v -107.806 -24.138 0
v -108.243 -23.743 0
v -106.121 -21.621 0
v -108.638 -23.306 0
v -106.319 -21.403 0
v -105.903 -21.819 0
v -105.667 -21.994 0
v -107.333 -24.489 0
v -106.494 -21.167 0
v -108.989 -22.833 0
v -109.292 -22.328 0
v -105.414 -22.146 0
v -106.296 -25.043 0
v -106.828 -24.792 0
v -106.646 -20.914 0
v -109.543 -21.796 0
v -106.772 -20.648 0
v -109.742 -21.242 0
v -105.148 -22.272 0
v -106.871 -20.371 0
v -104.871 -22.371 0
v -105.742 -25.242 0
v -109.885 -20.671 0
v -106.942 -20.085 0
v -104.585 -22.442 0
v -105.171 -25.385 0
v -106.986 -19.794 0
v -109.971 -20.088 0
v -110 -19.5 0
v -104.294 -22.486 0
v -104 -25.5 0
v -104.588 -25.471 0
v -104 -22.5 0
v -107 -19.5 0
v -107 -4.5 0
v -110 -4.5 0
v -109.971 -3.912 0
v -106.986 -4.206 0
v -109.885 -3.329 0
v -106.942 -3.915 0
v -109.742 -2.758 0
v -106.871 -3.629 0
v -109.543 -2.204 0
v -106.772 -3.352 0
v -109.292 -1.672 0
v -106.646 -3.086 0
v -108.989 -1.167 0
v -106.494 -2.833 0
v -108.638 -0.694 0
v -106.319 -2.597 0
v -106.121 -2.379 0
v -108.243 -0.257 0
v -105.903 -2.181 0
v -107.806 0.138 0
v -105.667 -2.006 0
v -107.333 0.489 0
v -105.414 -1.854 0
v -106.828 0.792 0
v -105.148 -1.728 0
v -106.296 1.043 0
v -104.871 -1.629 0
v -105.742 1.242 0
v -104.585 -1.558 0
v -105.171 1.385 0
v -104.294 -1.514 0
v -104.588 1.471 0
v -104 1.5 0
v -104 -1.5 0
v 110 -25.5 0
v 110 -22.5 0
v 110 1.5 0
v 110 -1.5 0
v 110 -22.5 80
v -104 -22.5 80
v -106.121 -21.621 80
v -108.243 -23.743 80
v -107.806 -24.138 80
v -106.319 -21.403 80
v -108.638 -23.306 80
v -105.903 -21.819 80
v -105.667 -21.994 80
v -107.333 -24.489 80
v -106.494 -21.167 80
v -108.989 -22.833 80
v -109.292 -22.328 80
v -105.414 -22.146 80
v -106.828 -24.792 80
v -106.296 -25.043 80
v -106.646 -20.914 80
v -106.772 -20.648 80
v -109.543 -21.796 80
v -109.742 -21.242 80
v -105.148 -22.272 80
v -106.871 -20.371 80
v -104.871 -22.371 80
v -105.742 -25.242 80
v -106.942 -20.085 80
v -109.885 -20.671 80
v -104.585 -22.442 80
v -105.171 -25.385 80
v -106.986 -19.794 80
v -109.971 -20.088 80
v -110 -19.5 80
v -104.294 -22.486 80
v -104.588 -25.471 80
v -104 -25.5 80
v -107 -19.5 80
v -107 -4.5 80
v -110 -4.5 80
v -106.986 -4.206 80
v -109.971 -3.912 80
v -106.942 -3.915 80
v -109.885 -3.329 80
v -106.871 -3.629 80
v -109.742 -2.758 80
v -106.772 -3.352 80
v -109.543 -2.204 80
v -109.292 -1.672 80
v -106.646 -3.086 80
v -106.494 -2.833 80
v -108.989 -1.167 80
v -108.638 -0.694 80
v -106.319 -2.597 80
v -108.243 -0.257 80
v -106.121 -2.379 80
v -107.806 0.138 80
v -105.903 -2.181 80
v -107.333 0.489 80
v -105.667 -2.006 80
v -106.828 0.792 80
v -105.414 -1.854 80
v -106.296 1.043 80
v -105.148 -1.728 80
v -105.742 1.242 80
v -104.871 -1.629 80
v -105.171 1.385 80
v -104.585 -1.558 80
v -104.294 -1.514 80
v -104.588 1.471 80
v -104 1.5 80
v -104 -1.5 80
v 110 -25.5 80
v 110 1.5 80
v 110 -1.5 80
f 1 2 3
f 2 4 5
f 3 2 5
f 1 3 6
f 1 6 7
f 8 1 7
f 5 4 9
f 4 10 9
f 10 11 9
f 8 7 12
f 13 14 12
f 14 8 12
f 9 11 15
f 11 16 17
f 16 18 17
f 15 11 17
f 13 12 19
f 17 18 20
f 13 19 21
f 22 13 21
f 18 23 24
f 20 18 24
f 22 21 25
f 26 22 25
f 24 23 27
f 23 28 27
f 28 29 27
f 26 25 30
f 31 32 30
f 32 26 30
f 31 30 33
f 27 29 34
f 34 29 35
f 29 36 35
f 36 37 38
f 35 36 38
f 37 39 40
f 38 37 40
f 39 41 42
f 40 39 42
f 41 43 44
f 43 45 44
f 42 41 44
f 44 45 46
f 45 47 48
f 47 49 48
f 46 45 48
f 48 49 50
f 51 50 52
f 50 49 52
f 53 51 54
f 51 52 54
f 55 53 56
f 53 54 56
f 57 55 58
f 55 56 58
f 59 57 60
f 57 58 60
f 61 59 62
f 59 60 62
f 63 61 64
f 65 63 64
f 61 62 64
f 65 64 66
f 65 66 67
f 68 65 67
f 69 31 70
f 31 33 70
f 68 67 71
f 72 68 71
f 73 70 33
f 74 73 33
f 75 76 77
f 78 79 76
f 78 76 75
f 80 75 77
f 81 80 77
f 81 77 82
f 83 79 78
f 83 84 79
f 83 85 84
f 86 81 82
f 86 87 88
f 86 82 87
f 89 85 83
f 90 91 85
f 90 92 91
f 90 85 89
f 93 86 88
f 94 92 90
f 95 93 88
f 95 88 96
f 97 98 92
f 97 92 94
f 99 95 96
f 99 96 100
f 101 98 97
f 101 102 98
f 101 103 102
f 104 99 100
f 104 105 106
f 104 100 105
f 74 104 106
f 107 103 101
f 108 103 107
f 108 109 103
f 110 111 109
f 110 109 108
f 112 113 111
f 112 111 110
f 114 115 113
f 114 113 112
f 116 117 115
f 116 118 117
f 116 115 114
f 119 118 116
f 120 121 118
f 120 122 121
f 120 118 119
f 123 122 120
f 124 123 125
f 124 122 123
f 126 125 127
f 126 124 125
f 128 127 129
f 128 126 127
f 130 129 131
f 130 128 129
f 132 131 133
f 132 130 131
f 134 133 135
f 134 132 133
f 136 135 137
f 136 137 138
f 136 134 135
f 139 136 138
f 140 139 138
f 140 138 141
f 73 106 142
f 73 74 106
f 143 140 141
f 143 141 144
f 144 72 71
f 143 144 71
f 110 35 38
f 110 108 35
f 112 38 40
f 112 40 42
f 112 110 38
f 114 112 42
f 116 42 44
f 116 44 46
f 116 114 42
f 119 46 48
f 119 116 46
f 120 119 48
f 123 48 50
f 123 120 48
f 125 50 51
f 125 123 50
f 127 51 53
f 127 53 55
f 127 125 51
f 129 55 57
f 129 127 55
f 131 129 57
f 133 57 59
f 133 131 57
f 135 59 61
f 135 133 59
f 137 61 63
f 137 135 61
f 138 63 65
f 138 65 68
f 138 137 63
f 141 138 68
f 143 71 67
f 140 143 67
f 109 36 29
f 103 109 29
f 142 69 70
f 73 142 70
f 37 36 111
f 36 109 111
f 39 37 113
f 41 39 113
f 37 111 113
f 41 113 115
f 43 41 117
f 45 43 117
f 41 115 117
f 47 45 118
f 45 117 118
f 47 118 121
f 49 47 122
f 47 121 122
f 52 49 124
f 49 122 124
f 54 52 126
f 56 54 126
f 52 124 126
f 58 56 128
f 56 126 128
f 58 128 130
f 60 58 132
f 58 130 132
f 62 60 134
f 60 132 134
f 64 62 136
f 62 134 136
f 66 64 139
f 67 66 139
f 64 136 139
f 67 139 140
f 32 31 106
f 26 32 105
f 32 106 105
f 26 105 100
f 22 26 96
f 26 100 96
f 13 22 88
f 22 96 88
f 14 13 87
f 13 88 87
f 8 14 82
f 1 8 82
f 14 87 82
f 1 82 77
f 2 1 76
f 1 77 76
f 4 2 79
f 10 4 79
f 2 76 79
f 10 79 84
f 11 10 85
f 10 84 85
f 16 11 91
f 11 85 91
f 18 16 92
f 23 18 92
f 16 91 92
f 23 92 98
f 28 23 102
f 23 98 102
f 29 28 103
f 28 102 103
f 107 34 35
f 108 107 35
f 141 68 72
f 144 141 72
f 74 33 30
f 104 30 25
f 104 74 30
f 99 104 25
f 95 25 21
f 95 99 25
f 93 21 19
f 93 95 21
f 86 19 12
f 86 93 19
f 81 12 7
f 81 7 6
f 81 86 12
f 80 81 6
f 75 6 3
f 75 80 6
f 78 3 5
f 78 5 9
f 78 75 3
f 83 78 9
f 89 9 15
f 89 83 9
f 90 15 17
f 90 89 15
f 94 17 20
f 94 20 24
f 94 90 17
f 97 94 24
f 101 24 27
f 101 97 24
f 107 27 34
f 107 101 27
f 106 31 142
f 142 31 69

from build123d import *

# Parameters (mm, degrees)
F0_W     = 3
F0_H     = 21
F1_DEPTH = 80
F2_R     = 3
F3_R     = 6


with BuildPart() as f1:
    # F0 (on Top) → F1 (new body)
    with BuildSketch(Plane.XY):
        Polygon((-110, 1.5), (-110, -1.5), (-107, -1.5), (110, -1.5), (110, 1.5), align=None)
        with Locations((-108.5, -12)):
            Rectangle(F0_W, F0_H)
        Polygon((-107, -22.5), (-110, -22.5), (-110, -25.5), (110, -25.5), (110, -22.5), align=None)
    extrude(amount=F1_DEPTH)

    # F2
    f2_edges = [f1.edges().sort_by_distance(p)[0] for p in [
        (-107, -1.5, 40),
        (-107, -22.5, 40),
    ]]
    fillet(f2_edges, radius=F2_R)

    # F3
    f3_edges = [f1.edges().sort_by_distance(p)[0] for p in [
        (-110, -25.5, 40),
        (-110, 1.5, 40),
    ]]
    fillet(f3_edges, radius=F3_R)


solid = f1.part
